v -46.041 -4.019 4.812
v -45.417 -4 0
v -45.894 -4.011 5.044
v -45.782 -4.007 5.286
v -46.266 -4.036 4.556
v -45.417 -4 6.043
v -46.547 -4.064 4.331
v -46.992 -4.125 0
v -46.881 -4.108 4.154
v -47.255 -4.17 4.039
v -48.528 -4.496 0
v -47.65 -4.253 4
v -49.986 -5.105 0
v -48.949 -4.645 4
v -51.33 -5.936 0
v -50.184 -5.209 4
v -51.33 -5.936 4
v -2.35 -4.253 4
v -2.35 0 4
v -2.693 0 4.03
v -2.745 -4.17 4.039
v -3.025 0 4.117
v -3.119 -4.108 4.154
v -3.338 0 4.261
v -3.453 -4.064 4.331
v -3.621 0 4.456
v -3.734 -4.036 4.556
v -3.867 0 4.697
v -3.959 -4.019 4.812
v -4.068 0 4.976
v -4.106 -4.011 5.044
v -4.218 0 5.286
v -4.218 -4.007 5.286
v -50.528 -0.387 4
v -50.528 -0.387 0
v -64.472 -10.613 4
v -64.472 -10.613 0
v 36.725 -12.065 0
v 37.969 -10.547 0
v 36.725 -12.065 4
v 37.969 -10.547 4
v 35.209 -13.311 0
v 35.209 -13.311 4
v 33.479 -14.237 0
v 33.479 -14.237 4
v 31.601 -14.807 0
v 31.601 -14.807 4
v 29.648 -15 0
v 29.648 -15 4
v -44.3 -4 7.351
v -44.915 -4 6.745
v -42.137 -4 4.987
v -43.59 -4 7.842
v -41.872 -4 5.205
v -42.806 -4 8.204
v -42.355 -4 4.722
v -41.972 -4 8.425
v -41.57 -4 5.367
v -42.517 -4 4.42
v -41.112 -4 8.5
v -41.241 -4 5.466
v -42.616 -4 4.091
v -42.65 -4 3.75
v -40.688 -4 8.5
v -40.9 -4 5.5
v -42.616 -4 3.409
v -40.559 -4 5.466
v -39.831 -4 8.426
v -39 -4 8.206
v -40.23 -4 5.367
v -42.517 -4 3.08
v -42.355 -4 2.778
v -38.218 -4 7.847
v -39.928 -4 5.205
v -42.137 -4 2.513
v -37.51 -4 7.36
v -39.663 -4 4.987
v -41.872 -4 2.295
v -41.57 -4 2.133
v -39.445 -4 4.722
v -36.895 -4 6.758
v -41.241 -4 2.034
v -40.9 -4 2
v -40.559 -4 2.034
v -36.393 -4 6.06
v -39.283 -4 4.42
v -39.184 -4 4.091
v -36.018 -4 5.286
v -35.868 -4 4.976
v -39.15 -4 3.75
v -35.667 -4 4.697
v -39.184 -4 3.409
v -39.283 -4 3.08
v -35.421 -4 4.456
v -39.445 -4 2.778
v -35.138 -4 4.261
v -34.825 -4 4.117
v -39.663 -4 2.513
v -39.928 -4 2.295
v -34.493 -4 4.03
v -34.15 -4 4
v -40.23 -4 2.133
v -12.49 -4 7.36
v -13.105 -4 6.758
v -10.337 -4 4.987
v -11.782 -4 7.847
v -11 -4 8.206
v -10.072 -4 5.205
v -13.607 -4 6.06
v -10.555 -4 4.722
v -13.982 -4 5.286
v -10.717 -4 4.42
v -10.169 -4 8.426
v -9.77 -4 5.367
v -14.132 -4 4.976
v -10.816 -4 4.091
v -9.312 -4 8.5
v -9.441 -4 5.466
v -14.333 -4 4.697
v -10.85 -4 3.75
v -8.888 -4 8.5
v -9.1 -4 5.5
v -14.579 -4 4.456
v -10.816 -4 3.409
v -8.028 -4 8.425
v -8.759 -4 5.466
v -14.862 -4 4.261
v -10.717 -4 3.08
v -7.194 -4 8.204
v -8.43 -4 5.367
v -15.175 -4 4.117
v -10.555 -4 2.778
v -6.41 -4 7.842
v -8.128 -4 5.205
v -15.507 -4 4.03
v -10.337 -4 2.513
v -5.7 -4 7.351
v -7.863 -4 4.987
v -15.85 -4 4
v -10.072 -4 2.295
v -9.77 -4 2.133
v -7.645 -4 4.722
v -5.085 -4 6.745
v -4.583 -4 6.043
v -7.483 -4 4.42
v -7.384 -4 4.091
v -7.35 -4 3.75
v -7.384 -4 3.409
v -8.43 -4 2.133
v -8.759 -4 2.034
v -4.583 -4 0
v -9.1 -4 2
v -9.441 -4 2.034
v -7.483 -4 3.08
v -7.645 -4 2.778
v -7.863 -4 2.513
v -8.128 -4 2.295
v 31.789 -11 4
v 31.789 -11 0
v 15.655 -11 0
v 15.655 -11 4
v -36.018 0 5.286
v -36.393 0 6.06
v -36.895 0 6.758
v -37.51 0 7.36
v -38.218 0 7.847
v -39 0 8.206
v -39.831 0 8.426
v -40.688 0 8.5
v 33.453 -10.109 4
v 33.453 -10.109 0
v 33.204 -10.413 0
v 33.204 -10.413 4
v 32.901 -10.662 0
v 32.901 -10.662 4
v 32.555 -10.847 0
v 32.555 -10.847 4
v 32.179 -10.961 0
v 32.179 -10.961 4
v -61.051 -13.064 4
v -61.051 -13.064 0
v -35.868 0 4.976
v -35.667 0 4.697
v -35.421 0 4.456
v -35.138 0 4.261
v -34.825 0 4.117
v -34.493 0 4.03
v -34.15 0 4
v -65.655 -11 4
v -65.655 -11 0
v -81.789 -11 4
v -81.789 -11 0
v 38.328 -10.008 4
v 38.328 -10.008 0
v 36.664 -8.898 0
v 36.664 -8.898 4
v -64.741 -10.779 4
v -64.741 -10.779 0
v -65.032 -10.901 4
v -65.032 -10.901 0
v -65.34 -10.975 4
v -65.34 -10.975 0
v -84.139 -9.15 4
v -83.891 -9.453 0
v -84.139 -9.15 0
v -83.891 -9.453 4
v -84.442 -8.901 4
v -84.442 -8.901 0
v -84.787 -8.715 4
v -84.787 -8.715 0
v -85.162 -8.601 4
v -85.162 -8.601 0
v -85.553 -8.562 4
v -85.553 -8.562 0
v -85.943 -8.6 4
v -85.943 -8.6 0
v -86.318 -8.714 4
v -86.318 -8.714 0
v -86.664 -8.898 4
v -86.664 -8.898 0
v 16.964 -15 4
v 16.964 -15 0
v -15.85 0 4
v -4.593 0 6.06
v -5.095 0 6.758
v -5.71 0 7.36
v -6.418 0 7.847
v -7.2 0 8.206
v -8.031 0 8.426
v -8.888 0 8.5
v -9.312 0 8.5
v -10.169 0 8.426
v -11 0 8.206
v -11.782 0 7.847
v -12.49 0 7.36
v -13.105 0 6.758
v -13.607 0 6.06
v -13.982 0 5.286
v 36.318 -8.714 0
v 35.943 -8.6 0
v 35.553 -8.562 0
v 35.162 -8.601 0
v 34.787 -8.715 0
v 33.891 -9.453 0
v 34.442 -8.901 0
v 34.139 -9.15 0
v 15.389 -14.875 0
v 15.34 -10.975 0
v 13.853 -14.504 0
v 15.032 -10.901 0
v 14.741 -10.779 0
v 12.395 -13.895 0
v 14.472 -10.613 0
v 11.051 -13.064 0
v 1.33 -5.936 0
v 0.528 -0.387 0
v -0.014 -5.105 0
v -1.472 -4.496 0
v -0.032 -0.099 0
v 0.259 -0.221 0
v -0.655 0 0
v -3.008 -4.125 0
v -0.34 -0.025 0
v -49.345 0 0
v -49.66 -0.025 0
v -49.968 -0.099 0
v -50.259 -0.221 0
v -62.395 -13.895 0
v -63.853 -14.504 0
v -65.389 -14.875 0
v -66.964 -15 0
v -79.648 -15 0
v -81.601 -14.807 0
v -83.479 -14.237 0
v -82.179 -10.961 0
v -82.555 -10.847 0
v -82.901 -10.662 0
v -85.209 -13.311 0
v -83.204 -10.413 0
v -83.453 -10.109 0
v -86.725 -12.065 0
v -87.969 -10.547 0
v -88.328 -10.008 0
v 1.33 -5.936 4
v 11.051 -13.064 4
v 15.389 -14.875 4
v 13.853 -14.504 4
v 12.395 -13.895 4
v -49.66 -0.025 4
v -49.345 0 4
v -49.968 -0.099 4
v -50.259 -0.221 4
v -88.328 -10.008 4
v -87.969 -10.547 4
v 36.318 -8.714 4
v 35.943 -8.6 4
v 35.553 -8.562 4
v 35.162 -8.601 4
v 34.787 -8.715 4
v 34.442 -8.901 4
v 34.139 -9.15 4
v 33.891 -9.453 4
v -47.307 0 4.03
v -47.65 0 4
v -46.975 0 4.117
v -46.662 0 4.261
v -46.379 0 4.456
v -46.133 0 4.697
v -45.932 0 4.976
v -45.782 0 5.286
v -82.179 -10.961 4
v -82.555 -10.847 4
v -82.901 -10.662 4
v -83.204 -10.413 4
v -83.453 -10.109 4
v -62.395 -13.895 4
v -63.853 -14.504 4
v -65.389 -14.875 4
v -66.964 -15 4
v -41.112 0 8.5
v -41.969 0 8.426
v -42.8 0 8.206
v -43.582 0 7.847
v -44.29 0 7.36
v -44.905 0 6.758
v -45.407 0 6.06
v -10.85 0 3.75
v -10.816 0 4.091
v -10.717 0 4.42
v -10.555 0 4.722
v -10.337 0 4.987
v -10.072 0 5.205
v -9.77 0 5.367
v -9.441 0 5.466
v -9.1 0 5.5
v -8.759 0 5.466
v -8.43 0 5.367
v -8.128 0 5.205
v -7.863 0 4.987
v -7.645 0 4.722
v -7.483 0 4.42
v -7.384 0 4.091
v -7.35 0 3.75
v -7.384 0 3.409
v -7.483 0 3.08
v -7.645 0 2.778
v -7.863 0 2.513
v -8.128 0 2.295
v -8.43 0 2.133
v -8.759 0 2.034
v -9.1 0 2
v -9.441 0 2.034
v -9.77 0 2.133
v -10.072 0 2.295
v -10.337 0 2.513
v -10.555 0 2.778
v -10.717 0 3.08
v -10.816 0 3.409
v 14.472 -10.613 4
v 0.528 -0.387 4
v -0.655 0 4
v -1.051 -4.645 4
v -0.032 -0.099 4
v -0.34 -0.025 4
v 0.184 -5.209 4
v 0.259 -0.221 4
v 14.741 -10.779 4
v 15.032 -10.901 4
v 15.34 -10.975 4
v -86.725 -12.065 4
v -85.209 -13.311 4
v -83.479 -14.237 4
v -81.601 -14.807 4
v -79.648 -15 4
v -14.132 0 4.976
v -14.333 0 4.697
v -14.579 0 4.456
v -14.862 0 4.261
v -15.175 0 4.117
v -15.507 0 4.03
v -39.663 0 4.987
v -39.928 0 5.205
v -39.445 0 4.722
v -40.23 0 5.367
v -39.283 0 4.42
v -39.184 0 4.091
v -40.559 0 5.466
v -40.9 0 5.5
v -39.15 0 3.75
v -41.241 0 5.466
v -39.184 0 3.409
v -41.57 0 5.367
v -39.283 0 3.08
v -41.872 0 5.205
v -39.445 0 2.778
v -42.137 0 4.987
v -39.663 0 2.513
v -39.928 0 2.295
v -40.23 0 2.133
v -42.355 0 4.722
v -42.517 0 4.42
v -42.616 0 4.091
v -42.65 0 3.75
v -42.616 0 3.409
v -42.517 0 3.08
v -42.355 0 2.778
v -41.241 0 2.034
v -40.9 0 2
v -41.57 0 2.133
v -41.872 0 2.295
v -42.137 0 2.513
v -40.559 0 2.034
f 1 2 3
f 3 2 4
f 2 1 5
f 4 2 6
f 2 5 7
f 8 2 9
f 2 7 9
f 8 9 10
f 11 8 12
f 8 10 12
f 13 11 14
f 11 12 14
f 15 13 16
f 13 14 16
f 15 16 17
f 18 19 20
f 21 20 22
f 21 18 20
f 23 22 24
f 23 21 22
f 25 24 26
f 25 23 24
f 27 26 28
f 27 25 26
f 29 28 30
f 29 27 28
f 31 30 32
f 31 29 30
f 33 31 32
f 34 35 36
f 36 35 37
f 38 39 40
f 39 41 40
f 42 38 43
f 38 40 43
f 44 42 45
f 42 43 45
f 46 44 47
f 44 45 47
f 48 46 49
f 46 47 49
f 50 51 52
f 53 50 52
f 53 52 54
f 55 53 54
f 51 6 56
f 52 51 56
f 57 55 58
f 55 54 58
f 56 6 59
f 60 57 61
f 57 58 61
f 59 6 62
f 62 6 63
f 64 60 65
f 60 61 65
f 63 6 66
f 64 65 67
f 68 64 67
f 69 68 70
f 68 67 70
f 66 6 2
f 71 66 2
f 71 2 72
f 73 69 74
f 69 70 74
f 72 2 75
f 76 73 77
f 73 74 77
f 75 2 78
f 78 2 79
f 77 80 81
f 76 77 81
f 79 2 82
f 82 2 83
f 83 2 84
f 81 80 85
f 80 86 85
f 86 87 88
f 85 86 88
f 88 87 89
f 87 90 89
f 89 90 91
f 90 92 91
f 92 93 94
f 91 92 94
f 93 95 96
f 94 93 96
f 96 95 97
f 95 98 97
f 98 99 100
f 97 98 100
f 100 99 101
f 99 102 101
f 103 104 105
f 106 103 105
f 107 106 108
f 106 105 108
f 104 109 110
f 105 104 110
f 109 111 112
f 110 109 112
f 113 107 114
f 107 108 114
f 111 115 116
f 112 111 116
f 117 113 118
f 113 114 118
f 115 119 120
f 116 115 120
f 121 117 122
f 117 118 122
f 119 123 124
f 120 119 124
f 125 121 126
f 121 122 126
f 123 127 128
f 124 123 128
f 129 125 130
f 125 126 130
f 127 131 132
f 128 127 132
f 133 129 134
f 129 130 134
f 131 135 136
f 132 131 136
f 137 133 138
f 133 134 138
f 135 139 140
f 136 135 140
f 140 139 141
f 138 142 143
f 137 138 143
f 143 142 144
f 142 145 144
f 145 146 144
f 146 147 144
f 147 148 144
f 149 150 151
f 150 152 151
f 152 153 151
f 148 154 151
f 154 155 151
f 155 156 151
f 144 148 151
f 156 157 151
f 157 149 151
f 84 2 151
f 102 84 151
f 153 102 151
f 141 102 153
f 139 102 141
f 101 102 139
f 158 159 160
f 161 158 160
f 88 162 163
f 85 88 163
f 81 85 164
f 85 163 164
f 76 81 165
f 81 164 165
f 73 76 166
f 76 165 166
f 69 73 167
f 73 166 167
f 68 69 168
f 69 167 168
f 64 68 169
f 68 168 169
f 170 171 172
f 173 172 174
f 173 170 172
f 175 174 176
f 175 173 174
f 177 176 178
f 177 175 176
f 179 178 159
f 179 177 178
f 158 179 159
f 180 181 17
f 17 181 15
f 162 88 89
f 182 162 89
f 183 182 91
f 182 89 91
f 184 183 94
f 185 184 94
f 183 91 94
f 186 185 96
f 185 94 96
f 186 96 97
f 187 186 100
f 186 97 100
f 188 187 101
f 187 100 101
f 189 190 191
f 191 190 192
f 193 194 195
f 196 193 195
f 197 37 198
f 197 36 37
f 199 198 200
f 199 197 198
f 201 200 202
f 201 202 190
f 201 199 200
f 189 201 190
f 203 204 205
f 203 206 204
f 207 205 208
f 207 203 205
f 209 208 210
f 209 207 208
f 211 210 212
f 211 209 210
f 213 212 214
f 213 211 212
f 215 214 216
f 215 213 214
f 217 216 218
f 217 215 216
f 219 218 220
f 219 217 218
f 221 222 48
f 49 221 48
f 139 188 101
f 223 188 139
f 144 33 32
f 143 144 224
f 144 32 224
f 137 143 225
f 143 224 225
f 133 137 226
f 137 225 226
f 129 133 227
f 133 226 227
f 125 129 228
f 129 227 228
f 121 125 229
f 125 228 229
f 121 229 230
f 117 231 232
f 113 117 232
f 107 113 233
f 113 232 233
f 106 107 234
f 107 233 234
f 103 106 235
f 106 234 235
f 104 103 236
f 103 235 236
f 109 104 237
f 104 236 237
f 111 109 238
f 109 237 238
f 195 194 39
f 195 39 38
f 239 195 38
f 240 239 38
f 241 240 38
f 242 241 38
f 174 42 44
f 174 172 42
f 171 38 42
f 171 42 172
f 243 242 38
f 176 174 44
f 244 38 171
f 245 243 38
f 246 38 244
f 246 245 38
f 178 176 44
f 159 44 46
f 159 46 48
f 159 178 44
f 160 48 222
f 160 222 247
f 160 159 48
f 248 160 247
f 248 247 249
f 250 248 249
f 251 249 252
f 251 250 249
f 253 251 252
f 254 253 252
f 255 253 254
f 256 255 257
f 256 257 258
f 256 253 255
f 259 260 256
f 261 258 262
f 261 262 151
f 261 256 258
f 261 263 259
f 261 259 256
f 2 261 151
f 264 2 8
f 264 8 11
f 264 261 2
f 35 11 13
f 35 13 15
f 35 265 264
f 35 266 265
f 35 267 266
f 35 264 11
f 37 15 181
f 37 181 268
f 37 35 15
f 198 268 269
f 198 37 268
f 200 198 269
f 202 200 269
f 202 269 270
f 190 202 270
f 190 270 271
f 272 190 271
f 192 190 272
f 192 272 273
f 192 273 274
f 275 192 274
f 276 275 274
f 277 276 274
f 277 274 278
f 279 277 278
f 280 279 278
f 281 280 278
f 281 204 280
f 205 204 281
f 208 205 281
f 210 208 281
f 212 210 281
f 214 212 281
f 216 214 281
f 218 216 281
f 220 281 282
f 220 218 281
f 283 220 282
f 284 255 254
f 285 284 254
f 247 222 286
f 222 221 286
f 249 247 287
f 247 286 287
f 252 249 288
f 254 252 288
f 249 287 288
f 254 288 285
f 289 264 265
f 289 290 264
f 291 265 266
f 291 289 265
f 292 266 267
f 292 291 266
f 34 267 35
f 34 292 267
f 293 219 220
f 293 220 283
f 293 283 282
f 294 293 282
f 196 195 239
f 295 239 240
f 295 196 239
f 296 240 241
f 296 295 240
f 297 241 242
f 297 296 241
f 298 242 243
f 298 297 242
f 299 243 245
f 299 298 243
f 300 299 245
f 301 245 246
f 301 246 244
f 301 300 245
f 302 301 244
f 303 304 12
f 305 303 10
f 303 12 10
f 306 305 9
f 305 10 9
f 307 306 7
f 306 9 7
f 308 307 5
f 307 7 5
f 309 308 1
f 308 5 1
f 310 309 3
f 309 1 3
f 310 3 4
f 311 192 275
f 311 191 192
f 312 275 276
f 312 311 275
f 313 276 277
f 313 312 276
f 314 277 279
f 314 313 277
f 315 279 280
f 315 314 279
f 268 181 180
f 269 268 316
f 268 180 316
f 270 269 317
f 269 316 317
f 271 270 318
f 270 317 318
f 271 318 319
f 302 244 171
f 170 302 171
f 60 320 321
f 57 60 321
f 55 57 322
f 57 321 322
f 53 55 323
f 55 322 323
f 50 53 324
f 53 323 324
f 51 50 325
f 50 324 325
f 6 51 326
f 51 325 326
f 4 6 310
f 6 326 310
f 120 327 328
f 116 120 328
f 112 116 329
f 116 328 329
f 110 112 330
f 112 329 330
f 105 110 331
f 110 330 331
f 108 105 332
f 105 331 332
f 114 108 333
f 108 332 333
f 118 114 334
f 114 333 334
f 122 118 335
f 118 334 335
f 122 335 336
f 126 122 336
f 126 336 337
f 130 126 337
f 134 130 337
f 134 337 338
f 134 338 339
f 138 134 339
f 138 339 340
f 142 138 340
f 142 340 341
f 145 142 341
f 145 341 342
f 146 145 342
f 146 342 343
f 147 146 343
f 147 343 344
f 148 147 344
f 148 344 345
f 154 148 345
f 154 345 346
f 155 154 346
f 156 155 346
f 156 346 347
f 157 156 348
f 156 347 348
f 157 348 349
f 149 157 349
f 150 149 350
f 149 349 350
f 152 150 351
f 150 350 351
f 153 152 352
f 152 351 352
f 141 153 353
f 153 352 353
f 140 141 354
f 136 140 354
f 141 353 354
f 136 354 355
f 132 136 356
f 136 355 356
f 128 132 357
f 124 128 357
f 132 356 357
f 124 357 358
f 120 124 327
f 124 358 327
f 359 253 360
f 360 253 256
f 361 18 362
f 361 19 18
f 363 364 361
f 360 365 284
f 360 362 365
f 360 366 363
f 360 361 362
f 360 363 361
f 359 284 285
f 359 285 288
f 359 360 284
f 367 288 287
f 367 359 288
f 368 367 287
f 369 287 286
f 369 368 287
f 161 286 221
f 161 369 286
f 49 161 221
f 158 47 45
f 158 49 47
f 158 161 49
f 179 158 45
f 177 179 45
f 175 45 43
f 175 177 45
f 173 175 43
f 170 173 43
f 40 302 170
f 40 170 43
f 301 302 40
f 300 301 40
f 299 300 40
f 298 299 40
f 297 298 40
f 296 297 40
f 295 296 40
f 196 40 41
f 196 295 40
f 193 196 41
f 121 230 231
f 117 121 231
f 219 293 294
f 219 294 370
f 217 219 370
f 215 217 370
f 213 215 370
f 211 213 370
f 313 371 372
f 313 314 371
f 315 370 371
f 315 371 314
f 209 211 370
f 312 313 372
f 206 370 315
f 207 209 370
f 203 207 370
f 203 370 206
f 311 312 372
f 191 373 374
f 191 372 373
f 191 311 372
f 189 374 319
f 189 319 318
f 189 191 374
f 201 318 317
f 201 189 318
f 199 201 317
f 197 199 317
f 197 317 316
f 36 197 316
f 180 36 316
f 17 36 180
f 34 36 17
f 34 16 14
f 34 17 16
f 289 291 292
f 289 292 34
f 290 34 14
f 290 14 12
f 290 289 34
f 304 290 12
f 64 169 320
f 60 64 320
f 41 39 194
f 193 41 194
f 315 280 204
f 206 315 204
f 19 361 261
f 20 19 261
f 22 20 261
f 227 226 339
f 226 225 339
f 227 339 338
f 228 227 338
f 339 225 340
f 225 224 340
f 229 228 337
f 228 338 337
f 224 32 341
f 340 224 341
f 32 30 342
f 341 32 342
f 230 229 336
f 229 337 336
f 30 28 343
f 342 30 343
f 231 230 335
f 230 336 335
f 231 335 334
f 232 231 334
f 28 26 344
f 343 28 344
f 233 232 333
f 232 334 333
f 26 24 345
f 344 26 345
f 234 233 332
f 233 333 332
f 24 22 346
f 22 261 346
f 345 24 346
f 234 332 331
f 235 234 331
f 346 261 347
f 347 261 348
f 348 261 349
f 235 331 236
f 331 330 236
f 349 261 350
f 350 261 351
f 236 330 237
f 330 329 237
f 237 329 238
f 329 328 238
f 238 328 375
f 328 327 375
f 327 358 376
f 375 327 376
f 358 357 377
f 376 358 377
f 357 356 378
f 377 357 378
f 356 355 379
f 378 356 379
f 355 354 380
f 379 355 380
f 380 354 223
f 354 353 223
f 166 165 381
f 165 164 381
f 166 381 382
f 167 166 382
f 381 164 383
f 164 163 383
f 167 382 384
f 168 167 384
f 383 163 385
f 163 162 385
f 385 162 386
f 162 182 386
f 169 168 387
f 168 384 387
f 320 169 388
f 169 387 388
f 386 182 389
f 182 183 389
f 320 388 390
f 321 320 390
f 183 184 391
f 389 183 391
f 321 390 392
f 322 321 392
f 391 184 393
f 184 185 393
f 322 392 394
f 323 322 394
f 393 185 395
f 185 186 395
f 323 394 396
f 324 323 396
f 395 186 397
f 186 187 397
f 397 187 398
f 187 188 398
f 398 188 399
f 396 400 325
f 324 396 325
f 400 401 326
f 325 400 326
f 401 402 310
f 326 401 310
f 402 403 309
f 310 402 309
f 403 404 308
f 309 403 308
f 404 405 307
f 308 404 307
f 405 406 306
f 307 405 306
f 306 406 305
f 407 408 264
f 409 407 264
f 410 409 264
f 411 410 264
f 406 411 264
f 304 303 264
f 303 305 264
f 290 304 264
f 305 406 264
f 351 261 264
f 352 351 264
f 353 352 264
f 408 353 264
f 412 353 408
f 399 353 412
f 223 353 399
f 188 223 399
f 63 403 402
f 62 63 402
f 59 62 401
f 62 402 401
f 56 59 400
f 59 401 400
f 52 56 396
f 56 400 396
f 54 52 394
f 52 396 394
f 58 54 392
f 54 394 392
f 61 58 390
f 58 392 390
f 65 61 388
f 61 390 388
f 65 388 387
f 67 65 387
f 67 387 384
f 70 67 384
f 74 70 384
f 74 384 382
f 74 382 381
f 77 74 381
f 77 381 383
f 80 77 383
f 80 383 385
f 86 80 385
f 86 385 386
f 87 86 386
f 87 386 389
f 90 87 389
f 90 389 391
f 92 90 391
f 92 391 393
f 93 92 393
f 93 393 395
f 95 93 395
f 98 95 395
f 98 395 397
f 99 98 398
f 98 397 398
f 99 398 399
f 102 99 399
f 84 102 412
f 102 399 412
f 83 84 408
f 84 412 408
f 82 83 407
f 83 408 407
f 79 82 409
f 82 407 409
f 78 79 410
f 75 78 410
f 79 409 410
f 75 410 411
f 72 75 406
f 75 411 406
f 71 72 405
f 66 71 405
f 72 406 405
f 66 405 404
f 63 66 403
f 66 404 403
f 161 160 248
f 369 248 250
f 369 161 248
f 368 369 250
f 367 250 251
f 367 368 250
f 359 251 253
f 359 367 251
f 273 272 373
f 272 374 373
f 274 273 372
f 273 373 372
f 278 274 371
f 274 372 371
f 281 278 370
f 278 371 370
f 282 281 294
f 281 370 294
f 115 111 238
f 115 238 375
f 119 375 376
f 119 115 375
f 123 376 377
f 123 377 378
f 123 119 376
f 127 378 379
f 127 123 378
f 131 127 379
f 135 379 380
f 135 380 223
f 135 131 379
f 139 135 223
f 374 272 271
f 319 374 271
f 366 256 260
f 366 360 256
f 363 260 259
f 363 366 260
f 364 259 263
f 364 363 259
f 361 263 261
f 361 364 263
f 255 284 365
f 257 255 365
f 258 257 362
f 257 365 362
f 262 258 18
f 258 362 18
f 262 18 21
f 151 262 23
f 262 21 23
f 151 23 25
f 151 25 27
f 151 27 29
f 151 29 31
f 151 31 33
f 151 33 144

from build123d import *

# Parameters (mm, degrees)
F1_DEPTH    = 4
F2_W        = 9.5
F2_H        = 8.5
F3_DEPTH    = 4
F4_R        = 1.75
F5_DEPTH    = 154
F6_R        = 10
F7_R        = 2
F8_R        = 2
F9_T1_DEPTH = 26.6944612474
F9_T3_DEPTH = 26.6917420766


# Not quite as in the source:
# - a fillet or chamfer that OpenCascade refuses, or shapes differently, is made with other operations: its cross-section is extruded or revolved along the edge and cut away or added
# - an extrude ends at something that could not be found from the text; its depth is read off the source's solid


with BuildPart() as f1:
    # F0 (on Top) → F1 (new body)
    with BuildSketch(Plane.XY):
        Polygon((-82.859264966, -11), (-85, -7.7888974491), (-88.3282011774, -10.007698234), (-85, -15), (-63.6905180954, -15), (-48.6905180954, -4), (-1.3094819046, -4), (13.6905180954, -15), (35, -15), (38.3282011774, -10.007698234), (35, -7.7888974491), (32.859264966, -11), (15, -11), (0, 0), (-50, 0), (-65, -11), align=None)
    extrude(amount=F1_DEPTH)

    # F2 (on face) → F3 (join, through all)
    with BuildSketch(Plane(origin=(0, 0, 0), x_dir=(-1, 0, 0), z_dir=(0, 1, 0))):
        with Locations((9.1, 4.25)):
            Rectangle(F2_W, F2_H)
        with Locations((40.9, 4.25)):
            Rectangle(F2_W, F2_H)
    extrude(amount=-F3_DEPTH)

    # F4 (on face) → F5 (cut, through all)
    with BuildSketch(Plane(origin=(0, 0, 0), x_dir=(-1, 0, 0), z_dir=(0, 1, 0))):
        with Locations((9.1, 3.75)):
            Circle(F4_R)
        with Locations((40.9, 3.75)):
            Circle(F4_R)
    extrude(amount=-F5_DEPTH, mode=Mode.SUBTRACT)

    # F6
    f6_edges = [f1.edges().sort_by_distance(p)[0] for p in [
        (35, -15, 2),
        (13.690518, -15, 2),
        (-63.690518, -15, 2),
        (-85, -15, 2),
        (-48.690518, -4, 2),
        (-1.309482, -4, 2),
    ]]
    fillet(f6_edges, radius=F6_R)

    # F7
    f7_edges = [f1.edges().sort_by_distance(p)[0] for p in [
        (35, -7.788897, 2),
        (-85, -7.788897, 2),
        (-65, -11, 2),
        (-82.859265, -11, 2),
        (32.859265, -11, 2),
        (15, -11, 2),
        (0, 0, 2),
        (-50, 0, 2),
    ]]
    fillet(f7_edges, radius=F7_R)

    # F8
    f8_edges = [f1.edges().sort_by_distance(p)[0] for p in [
        (-45.65, -2.00136, 4),
        (-13.85, -2, 4),
        (-4.35, -2.00136, 4),
        (-36.15, -2, 4),
    ]]
    fillet(f8_edges, radius=F8_R)

    # F9: fillet of radius 5 on 4 edges, made by hand

    # F9_s2 → F9_t1 (cut)
    with BuildSketch(Plane.XZ.offset(-11.3458710383)):
        with BuildLine():
            ThreePointArc((-41.1116515847, 8.5), (-43.9463851322, 7.6187723552), (-45.7819004528, 5.2857142857))
            Line((-45.7819004528, 5.2857142857), (-46.2489253396, 5.4642857143))
            ThreePointArc((-46.2489253396, 5.4642857143), (-46.15, 6), (-46.15, 8.5))
            Line((-46.15, 8.5), (-45.65, 9))
            Line((-45.65, 9), (-41.1116515847, 9))
            Line((-41.1116515847, 9), (-41.1116515847, 8.5))
        make_face()
        with BuildLine():
            ThreePointArc((-4.2180995472, 5.2857142857), (-6.0536148677, 7.6187723552), (-8.8883484153, 8.5))
            Line((-8.8883484153, 8.5), (-8.8883484153, 9))
            Line((-8.8883484153, 9), (-4.35, 9))
            Line((-4.35, 9), (-3.85, 8.5))
            ThreePointArc((-3.85, 8.5), (-3.85, 6), (-3.7510746604, 5.4642857143))
            Line((-3.7510746604, 5.4642857143), (-4.2180995472, 5.2857142857))
        make_face()
    extrude(amount=F9_T1_DEPTH, mode=Mode.SUBTRACT)

    # F9_s4 → F9_t3 (cut)
    with BuildSketch(Plane.XZ.offset(-11.3458710383)):
        with BuildLine():
            ThreePointArc((-36.0180995472, 5.2857142857), (-37.8536148677, 7.6187723552), (-40.6883484153, 8.5))
            Line((-40.6883484153, 8.5), (-40.6883484153, 9))
            Line((-40.6883484153, 9), (-36.15, 9))
            Line((-36.15, 9), (-35.65, 8.5))
            ThreePointArc((-35.65, 8.5), (-35.65, 6), (-35.5510746604, 5.4642857143))
            Line((-35.5510746604, 5.4642857143), (-36.0180995472, 5.2857142857))
        make_face()
        with BuildLine():
            ThreePointArc((-9.3116515847, 8.5), (-12.1463851322, 7.6187723552), (-13.9819004528, 5.2857142857))
            Line((-13.9819004528, 5.2857142857), (-14.4489253396, 5.4642857143))
            ThreePointArc((-14.4489253396, 5.4642857143), (-14.35, 6), (-14.35, 8.5))
            Line((-14.35, 8.5), (-13.85, 9))
            Line((-13.85, 9), (-9.3116515847, 9))
            Line((-9.3116515847, 9), (-9.3116515847, 8.5))
        make_face()
    extrude(amount=F9_T3_DEPTH, mode=Mode.SUBTRACT)


solid = f1.part
